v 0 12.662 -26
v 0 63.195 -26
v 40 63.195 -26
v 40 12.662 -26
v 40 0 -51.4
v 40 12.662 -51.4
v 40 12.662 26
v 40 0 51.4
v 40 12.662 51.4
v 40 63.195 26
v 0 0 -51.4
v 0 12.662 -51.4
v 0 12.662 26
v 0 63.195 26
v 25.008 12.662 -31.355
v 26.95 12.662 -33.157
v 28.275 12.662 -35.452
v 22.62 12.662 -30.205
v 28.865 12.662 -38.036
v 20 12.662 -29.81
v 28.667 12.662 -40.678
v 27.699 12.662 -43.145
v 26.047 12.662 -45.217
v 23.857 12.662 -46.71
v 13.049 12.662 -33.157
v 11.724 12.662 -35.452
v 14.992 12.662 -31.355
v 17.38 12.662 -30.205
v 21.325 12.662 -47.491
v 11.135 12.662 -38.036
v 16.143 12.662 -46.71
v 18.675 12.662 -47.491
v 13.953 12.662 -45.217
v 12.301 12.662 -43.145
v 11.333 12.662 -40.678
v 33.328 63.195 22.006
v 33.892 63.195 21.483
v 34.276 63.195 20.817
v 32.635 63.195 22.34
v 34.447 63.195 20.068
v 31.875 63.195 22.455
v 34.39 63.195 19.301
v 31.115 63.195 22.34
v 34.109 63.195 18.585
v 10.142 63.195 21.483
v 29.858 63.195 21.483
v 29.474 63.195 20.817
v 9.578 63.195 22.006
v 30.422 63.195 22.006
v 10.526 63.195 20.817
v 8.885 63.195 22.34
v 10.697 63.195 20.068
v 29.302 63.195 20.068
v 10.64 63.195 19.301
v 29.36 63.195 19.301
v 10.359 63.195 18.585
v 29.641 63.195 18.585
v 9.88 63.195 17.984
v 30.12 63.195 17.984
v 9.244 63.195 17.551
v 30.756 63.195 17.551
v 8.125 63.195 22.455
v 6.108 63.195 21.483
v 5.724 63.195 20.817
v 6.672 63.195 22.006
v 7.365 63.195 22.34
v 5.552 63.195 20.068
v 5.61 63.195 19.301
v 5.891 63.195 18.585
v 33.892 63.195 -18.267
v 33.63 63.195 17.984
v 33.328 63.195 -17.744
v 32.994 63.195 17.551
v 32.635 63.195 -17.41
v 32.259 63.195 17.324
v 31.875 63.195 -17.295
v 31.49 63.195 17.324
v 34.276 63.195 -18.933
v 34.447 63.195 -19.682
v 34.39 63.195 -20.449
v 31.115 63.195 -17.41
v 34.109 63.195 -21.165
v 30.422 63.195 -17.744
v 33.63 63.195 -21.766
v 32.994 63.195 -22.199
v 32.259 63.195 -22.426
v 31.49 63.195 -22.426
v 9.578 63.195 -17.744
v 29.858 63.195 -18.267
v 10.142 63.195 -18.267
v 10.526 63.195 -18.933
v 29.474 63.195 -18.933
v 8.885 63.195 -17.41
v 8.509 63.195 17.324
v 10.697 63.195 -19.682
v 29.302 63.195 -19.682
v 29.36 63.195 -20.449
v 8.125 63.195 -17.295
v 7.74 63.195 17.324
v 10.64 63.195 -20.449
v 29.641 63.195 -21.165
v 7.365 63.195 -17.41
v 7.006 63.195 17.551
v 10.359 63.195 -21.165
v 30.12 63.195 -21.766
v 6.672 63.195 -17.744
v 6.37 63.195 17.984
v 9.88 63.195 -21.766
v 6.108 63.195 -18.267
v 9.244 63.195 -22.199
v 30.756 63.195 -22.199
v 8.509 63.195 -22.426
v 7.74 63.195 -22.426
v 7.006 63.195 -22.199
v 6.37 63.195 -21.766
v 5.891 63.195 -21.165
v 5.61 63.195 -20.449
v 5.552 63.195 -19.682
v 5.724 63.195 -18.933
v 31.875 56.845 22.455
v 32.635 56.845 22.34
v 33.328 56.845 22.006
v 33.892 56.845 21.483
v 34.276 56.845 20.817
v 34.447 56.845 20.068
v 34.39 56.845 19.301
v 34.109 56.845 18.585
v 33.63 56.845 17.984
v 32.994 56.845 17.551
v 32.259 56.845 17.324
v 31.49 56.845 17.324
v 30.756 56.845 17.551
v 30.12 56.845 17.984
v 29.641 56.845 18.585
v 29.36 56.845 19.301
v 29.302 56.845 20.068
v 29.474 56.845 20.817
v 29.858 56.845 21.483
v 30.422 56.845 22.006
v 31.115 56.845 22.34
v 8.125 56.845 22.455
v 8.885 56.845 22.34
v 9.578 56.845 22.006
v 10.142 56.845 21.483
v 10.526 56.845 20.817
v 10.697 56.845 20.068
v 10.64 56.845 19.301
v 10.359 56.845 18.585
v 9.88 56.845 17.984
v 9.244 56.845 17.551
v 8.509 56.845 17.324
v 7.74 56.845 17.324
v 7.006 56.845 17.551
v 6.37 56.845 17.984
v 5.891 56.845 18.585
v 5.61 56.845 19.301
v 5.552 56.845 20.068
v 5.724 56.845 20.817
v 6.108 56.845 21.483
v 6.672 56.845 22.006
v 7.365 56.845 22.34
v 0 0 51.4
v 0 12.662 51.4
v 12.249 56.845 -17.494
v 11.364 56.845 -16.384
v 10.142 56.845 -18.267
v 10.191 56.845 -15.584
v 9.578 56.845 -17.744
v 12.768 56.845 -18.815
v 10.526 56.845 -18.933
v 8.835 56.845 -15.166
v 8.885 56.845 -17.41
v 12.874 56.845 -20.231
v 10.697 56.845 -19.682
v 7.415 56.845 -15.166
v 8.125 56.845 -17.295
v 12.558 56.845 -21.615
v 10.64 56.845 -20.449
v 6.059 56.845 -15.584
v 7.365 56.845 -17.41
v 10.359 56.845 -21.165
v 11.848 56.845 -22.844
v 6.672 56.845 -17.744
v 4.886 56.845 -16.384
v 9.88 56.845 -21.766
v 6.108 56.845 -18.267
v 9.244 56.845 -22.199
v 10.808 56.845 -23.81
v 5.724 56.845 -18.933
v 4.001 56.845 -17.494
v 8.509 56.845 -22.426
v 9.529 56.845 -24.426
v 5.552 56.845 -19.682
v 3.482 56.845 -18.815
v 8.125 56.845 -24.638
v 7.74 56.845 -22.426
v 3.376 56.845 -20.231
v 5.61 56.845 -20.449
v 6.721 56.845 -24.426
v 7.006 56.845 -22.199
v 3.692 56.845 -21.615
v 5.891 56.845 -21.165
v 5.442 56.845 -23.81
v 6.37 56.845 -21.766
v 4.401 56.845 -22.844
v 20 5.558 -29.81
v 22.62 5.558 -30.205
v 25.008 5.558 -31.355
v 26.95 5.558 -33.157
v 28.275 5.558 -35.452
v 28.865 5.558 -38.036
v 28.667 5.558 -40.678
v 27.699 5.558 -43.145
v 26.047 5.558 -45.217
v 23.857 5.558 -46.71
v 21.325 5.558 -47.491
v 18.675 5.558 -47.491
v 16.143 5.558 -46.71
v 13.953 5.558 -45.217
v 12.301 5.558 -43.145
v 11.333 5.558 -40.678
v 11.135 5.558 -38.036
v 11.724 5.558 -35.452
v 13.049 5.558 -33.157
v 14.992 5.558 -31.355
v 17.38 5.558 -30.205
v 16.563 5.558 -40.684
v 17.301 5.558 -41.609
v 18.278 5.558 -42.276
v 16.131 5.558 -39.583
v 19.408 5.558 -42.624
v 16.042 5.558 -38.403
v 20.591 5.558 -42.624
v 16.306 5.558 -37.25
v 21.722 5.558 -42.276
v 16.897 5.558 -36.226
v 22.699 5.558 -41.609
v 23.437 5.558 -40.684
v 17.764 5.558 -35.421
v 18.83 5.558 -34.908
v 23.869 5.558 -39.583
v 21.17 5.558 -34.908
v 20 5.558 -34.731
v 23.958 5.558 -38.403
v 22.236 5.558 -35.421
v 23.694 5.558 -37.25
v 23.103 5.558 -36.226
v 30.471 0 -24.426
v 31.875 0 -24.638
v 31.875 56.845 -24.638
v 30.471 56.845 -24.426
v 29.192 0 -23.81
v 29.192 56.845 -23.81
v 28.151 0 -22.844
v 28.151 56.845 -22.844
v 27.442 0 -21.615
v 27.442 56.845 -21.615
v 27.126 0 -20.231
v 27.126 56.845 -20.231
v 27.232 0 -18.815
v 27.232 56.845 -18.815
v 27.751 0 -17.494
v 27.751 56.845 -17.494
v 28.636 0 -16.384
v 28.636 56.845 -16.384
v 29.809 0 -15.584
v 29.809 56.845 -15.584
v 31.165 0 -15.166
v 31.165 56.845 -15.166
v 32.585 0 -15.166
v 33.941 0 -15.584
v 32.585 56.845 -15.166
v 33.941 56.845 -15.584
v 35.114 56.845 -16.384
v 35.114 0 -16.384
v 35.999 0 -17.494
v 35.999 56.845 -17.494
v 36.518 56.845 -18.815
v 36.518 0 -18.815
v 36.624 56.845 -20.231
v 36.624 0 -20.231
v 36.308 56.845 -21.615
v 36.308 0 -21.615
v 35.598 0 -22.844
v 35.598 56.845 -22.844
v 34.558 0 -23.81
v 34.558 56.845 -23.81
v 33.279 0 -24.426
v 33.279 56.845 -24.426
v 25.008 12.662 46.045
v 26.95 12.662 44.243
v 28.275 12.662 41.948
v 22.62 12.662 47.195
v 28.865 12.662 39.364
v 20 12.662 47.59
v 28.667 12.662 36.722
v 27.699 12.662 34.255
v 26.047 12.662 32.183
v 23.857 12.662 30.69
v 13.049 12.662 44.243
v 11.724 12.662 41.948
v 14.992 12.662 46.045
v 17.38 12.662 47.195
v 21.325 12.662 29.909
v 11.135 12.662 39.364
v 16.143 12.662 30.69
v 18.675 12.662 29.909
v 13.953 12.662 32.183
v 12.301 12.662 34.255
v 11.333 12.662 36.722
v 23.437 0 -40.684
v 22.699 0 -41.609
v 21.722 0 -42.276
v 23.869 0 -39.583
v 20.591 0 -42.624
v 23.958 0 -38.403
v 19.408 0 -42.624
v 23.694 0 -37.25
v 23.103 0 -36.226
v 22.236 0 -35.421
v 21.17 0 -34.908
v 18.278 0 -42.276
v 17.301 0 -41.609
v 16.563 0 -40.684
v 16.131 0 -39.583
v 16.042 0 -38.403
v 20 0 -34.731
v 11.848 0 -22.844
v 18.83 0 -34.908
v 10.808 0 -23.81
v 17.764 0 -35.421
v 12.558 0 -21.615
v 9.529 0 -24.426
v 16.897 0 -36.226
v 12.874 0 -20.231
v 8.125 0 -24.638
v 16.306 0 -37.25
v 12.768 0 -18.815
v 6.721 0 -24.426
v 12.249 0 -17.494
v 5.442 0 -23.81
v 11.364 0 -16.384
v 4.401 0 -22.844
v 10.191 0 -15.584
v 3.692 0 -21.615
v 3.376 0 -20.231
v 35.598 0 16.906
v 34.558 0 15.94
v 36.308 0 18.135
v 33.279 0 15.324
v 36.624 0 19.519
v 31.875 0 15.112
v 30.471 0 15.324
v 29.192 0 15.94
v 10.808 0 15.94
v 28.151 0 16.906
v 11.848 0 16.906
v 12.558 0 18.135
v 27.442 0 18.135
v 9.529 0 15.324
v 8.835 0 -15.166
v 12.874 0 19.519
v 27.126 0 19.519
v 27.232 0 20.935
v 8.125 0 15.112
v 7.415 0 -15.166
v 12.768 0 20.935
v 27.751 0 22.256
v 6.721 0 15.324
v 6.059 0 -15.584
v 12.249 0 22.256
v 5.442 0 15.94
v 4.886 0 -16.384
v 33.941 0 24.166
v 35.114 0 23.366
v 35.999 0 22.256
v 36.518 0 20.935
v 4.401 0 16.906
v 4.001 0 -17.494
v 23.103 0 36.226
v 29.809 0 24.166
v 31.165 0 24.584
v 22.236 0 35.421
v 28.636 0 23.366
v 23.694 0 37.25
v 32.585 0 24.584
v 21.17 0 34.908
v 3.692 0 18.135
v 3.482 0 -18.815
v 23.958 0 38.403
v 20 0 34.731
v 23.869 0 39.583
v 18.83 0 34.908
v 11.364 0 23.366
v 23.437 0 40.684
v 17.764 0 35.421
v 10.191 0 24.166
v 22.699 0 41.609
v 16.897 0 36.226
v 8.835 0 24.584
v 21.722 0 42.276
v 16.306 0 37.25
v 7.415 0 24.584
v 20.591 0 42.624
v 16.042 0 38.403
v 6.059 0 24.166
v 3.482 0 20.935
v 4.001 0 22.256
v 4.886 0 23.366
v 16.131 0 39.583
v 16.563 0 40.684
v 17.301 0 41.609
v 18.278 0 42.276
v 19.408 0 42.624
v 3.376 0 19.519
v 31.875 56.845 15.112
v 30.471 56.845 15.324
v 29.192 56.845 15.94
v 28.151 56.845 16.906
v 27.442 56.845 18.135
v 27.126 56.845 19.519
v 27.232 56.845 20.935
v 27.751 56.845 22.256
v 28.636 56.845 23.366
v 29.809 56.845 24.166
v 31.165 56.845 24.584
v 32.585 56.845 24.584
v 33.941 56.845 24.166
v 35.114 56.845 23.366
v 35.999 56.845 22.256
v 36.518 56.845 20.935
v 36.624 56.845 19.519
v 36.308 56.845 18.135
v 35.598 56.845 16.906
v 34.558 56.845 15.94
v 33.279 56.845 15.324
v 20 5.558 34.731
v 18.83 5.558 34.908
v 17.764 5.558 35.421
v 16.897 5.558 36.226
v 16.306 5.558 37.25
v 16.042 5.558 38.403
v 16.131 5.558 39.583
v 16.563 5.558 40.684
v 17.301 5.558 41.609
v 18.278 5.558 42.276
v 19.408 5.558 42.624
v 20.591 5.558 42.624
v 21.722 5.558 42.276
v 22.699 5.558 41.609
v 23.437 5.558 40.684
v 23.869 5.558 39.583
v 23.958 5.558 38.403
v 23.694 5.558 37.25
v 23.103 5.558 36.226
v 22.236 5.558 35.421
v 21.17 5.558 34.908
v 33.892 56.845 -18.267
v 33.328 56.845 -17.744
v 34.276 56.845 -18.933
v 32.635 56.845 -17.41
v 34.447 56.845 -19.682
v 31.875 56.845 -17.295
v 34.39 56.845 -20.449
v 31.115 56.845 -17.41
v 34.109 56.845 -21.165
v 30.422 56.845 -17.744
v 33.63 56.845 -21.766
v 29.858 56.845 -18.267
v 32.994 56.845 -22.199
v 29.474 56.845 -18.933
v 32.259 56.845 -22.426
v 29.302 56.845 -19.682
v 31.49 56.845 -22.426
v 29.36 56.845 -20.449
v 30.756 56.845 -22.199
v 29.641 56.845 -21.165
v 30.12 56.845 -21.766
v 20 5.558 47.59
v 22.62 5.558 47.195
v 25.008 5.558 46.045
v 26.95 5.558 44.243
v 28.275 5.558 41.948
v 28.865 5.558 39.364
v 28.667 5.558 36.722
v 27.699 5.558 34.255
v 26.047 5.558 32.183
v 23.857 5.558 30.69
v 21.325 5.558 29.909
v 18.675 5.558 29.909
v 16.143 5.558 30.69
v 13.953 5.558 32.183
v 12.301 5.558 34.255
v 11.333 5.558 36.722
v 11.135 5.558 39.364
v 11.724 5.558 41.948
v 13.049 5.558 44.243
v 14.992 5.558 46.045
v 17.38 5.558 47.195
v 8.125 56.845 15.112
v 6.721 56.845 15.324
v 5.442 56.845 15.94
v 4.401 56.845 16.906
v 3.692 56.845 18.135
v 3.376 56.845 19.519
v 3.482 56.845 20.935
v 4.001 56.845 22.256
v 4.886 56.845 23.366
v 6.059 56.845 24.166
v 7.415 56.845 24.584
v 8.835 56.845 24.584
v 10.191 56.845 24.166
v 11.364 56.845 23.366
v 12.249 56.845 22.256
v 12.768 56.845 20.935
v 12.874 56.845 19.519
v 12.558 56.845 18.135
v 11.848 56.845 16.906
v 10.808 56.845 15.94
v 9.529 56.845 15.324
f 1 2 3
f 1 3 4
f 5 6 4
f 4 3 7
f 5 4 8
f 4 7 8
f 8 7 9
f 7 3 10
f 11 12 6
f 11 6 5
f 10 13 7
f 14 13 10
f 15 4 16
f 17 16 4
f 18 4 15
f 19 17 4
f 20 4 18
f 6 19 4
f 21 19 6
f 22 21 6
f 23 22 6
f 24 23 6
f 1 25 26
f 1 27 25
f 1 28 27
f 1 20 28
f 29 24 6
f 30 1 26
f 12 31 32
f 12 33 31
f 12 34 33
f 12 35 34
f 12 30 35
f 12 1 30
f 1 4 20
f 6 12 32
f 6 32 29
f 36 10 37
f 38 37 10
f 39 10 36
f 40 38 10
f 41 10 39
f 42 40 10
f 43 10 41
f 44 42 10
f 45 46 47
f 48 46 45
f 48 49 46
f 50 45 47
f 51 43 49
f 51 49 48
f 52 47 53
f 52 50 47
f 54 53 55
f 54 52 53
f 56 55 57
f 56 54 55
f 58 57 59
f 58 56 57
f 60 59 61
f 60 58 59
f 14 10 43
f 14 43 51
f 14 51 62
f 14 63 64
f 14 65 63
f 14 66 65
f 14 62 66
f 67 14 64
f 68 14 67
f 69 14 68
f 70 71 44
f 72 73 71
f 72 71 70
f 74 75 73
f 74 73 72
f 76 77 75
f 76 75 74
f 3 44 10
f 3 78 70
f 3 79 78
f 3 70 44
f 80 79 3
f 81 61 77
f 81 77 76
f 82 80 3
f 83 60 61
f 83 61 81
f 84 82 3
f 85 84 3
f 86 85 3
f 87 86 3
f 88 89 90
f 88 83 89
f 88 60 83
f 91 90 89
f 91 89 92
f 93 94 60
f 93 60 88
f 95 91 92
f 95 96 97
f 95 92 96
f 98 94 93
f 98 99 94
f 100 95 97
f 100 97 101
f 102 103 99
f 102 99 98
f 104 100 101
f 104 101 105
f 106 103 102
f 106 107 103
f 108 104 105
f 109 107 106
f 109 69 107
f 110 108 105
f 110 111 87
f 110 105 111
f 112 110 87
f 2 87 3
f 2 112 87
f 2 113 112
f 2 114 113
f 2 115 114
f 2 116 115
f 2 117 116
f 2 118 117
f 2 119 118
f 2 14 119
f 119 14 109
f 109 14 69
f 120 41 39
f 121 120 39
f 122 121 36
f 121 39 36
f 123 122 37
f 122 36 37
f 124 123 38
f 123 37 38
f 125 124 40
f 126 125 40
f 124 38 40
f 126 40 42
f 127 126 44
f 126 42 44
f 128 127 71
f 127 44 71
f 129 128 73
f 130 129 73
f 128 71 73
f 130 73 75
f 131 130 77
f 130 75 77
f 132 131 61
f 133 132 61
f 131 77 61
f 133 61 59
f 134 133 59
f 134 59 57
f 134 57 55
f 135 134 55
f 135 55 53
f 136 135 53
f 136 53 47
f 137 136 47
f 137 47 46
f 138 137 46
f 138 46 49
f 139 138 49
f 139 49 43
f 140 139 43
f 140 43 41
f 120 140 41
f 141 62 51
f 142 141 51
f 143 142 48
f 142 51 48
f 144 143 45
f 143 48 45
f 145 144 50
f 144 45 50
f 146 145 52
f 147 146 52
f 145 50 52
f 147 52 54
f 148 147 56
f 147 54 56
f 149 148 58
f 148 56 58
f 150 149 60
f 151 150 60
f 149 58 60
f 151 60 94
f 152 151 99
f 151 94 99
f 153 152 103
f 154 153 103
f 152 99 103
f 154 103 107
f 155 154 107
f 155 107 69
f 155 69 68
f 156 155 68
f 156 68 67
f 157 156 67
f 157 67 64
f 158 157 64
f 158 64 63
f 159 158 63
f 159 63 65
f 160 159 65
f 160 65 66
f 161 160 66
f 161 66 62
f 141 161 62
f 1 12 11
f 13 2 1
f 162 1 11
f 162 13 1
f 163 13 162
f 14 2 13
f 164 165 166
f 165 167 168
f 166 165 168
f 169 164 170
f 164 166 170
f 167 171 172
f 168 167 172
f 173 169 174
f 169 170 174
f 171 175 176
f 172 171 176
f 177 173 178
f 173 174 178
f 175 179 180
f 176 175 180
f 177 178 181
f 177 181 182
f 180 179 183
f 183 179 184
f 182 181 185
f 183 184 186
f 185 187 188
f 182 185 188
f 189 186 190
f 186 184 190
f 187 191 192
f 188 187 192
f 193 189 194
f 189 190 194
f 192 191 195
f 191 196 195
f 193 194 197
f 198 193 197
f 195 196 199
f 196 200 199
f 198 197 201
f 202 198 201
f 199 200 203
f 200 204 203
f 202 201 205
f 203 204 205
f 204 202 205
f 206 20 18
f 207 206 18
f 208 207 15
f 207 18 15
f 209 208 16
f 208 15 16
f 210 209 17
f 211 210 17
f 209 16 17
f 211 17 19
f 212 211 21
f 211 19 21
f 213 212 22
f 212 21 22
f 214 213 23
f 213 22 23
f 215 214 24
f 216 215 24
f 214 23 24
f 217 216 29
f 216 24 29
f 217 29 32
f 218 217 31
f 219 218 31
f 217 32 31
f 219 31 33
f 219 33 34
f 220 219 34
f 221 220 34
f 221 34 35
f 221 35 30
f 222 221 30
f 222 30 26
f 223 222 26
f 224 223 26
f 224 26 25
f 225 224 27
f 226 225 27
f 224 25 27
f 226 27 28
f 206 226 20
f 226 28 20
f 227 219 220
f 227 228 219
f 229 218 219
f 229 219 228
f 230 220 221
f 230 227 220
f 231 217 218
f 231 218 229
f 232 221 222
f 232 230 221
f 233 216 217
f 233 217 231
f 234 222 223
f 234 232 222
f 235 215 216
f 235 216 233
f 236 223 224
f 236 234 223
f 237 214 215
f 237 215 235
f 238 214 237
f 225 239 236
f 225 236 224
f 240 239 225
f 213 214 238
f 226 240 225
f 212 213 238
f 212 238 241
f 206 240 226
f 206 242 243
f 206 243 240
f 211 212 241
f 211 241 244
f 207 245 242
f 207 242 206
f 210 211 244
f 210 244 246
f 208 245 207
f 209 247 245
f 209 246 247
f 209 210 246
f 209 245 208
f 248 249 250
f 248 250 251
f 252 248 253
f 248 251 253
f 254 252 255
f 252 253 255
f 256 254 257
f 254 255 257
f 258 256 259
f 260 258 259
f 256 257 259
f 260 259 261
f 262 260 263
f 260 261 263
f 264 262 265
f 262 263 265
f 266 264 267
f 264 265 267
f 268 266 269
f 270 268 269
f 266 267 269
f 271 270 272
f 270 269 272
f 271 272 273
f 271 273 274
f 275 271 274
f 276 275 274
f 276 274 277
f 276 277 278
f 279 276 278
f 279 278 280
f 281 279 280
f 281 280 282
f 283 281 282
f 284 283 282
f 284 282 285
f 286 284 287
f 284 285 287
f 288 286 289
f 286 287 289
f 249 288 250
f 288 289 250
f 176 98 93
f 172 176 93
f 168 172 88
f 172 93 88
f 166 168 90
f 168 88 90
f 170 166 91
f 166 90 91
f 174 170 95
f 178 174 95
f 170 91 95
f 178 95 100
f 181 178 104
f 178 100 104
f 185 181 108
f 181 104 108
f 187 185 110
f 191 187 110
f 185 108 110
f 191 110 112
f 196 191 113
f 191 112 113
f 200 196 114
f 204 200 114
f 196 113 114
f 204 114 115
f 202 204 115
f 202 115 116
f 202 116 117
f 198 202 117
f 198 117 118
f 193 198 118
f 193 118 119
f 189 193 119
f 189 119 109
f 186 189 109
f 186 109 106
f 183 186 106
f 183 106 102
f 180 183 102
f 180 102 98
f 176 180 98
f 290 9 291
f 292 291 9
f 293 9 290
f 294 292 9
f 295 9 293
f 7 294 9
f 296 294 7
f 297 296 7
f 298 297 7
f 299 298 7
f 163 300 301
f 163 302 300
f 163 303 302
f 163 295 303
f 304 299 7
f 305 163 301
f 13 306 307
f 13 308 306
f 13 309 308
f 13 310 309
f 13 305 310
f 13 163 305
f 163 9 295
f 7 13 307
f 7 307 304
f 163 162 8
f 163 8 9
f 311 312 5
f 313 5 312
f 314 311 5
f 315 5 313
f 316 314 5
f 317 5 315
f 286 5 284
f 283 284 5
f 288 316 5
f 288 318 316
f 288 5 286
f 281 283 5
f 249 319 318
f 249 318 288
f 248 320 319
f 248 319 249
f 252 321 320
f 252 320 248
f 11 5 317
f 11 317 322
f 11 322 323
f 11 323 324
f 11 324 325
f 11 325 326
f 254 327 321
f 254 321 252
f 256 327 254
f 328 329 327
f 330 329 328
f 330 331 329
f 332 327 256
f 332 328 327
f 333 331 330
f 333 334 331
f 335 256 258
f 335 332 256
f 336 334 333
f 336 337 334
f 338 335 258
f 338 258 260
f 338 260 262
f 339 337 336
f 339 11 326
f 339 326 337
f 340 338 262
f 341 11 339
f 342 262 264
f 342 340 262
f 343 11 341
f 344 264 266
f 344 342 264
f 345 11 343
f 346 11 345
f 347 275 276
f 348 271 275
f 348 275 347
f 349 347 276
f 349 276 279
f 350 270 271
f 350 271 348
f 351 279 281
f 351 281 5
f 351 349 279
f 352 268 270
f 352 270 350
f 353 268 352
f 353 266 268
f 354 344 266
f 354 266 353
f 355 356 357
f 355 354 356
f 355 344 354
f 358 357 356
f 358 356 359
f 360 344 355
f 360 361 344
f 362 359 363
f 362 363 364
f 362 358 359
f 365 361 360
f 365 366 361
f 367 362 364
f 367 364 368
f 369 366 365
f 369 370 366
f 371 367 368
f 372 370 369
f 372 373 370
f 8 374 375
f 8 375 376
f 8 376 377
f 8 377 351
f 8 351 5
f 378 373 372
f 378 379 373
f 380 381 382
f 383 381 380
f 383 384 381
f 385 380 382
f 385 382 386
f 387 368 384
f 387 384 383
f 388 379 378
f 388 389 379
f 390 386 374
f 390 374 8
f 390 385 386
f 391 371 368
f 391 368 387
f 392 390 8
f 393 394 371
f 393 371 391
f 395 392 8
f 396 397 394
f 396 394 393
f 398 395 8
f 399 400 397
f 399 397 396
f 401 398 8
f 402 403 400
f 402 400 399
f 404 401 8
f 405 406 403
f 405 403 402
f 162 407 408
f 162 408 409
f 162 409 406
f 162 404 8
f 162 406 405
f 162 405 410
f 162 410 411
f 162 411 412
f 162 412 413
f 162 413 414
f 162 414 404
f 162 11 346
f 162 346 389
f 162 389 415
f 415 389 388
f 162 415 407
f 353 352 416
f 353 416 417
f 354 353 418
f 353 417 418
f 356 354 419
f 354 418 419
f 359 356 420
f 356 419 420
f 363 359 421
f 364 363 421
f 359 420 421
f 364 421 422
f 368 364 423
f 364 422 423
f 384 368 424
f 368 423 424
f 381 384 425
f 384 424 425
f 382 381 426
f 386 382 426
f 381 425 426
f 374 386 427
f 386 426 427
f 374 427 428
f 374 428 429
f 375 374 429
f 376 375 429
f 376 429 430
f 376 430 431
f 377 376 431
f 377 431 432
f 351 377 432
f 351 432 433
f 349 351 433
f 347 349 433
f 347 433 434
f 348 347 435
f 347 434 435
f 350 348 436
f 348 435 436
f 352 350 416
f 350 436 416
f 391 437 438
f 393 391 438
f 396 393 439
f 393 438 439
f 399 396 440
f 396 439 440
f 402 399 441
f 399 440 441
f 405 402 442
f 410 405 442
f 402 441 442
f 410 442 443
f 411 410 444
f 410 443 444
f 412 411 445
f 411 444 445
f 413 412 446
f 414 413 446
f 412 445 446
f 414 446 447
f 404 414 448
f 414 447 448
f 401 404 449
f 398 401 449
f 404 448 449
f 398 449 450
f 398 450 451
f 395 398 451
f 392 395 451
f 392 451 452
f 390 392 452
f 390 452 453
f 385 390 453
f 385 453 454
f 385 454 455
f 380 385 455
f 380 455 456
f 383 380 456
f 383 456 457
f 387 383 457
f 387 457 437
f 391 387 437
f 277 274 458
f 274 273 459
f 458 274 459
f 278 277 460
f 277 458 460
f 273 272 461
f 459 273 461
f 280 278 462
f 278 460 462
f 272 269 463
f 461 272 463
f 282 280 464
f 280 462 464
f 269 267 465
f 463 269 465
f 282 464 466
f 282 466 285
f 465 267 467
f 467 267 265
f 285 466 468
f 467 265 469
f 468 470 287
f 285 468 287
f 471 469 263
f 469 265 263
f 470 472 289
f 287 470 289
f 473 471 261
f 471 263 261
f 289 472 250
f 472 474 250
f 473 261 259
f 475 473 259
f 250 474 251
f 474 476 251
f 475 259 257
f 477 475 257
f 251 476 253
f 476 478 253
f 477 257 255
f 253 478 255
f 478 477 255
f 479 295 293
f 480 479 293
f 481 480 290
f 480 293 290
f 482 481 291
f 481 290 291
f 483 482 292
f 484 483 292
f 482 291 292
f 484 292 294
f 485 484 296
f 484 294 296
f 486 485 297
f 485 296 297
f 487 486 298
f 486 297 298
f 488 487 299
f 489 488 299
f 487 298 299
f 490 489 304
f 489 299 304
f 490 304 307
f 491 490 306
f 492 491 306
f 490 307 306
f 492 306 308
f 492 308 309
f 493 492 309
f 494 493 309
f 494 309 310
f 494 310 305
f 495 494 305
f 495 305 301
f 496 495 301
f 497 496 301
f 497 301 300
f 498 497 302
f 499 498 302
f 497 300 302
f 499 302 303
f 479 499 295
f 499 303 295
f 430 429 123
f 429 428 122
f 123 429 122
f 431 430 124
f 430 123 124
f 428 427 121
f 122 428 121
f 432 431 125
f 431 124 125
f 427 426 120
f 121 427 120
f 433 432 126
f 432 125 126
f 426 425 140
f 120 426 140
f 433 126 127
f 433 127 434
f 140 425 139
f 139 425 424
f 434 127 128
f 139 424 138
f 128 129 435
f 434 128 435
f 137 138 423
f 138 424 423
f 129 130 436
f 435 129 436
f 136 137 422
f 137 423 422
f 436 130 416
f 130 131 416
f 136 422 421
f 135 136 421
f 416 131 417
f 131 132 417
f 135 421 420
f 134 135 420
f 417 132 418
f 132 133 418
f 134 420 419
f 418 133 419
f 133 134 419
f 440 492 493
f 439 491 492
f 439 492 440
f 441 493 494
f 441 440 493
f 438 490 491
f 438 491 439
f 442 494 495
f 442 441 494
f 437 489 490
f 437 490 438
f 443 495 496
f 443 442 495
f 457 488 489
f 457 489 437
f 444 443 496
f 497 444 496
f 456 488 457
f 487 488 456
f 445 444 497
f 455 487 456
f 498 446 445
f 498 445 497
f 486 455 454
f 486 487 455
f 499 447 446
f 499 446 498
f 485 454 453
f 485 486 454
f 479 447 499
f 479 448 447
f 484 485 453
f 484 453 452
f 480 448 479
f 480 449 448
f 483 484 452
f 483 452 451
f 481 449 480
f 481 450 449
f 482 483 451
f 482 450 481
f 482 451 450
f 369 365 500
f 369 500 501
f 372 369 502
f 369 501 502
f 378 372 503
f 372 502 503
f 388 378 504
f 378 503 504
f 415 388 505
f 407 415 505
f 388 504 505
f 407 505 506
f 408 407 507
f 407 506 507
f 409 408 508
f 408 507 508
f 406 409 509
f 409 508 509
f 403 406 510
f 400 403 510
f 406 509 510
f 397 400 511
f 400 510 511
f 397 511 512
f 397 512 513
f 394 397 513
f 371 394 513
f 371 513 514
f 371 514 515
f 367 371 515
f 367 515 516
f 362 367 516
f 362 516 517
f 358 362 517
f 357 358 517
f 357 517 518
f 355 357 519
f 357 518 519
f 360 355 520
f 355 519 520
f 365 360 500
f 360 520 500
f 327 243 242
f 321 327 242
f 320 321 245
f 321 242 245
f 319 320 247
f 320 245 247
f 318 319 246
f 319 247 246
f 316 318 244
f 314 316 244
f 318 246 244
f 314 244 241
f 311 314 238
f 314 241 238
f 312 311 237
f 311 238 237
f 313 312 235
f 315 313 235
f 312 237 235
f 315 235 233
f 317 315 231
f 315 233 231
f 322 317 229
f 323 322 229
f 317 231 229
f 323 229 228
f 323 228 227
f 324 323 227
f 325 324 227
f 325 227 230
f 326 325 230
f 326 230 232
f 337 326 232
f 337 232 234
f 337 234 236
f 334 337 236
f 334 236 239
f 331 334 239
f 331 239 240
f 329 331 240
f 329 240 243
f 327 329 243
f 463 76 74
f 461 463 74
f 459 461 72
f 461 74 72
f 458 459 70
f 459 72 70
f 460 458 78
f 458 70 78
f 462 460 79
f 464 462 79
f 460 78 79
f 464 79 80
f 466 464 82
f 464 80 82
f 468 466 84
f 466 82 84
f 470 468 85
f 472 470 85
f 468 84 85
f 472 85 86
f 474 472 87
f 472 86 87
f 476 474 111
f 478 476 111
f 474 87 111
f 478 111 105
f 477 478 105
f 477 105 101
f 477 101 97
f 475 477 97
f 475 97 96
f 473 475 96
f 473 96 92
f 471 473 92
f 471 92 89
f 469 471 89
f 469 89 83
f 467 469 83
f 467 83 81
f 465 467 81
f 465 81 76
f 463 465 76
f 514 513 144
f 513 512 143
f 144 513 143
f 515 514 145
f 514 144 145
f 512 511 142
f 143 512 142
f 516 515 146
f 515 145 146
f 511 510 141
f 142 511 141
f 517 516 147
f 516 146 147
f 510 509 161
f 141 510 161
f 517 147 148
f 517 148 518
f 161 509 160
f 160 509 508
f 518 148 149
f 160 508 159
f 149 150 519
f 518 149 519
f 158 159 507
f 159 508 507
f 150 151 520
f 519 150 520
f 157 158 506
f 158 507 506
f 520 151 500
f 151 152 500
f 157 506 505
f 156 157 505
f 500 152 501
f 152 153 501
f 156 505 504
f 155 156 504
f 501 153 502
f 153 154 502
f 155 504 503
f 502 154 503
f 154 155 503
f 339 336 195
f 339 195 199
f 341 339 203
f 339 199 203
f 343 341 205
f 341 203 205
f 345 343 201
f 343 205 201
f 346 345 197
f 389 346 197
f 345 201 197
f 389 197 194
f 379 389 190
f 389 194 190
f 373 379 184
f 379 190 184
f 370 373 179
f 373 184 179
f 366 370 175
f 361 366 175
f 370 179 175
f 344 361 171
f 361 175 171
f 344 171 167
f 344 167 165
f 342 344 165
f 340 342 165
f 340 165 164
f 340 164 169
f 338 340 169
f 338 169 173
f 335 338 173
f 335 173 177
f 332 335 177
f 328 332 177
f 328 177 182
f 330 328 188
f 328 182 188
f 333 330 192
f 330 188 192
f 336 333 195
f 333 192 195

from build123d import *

# Parameters (mm, degrees)
BOSS_EXTRUDE1_DEPTH = 39.99992
SKETCH2_R           = 2.5796875
CUT_EXTRUDE1_DEPTH  = 91.750134452
CUT_EXTRUDE2_START  = -6.35
SKETCH2_3_R         = 4.7625
SKETCH2_3_R_2       = 2.5796875
CUT_EXTRUDE2_DEPTH  = 56.8452
SKETCH3_R           = 3.96875
CUT_EXTRUDE3_DEPTH  = 83.435235239
SKETCH3_5_R         = 8.89
SKETCH3_5_R_2       = 3.96875
CUT_EXTRUDE4_DEPTH  = 7.10438


with BuildPart() as part:
    # Sketch1 → Boss-Extrude1 (new body)
    with BuildSketch(Plane(origin=(0, 0, 0), x_dir=(0, 0, -1), z_dir=(1, 0, 0))):
        Polygon((51.4, 0), (-51.4, 0), (-51.4, 12.6619), (-26, 12.6619), (-26, 63.1952), (26, 63.1952), (26, 12.6619), (51.4, 12.6619), align=None)
    extrude(amount=BOSS_EXTRUDE1_DEPTH)

    # Sketch2 → Cut-Extrude1 (cut, through all)
    with BuildSketch(Plane(origin=(0, 63.1952, 0), x_dir=(1, 0, 0), z_dir=(0, 1, 0))):
        with Locations(Location((8.12496, 19.875, 0), (0, 0, 270))):
            Circle(SKETCH2_R)
        with Locations(Location((31.87496, 19.875, 0), (0, 0, 270))):
            Circle(SKETCH2_R)
        with Locations(Location((8.12496, -19.875, 0), (0, 0, 270))):
            Circle(SKETCH2_R)
        with Locations(Location((31.87496, -19.875, 0), (0, 0, 270))):
            Circle(SKETCH2_R)
    extrude(amount=-CUT_EXTRUDE1_DEPTH, mode=Mode.SUBTRACT)

    # Sketch2<3> → Cut-Extrude2 (cut)
    # profile 1 of 4: a face of its own
    with BuildSketch(Plane(origin=(0, 63.1952, 0), x_dir=(1, 0, 0), z_dir=(0, 1, 0)).offset(CUT_EXTRUDE2_START)):
        with Locations(Location((8.12496, 19.875, 0), (0, 0, 90))):
            Circle(SKETCH2_3_R)
        with Locations(Location((8.12496, 19.875, 0), (0, 0, 270))):
            Circle(SKETCH2_3_R_2, mode=Mode.SUBTRACT)
    # profile 2 of 4: a face of its own
    with BuildSketch(Plane(origin=(0, 63.1952, 0), x_dir=(1, 0, 0), z_dir=(0, 1, 0)).offset(CUT_EXTRUDE2_START)):
        with Locations(Location((31.87496, 19.875, 0), (0, 0, 90))):
            Circle(SKETCH2_3_R)
        with Locations(Location((31.87496, 19.875, 0), (0, 0, 270))):
            Circle(SKETCH2_3_R_2, mode=Mode.SUBTRACT)
    # profile 3 of 4: a face of its own
    with BuildSketch(Plane(origin=(0, 63.1952, 0), x_dir=(1, 0, 0), z_dir=(0, 1, 0)).offset(CUT_EXTRUDE2_START)):
        with Locations(Location((8.12496, -19.875, 0), (0, 0, 90))):
            Circle(SKETCH2_3_R)
        with Locations(Location((8.12496, -19.875, 0), (0, 0, 270))):
            Circle(SKETCH2_3_R_2, mode=Mode.SUBTRACT)
    # profile 4 of 4: a face of its own
    with BuildSketch(Plane(origin=(0, 63.1952, 0), x_dir=(1, 0, 0), z_dir=(0, 1, 0)).offset(CUT_EXTRUDE2_START)):
        with Locations(Location((31.87496, -19.875, 0), (0, 0, 90))):
            Circle(SKETCH2_3_R)
        with Locations(Location((31.87496, -19.875, 0), (0, 0, 270))):
            Circle(SKETCH2_3_R_2, mode=Mode.SUBTRACT)
    extrude(amount=-CUT_EXTRUDE2_DEPTH, mode=Mode.SUBTRACT)

    # Sketch3 → Cut-Extrude3 (cut, through all)
    with BuildSketch(Plane(origin=(0, 12.6619, 0), x_dir=(1, 0, 0), z_dir=(0, 1, 0))):
        with Locations(Location((19.99996, 38.7, 0), (0, 0, 270))):
            Circle(SKETCH3_R)
        with Locations(Location((19.99996, -38.7, 0), (0, 0, 90))):
            Circle(SKETCH3_R)
    extrude(amount=-CUT_EXTRUDE3_DEPTH, mode=Mode.SUBTRACT)

    # Sketch3<5> → Cut-Extrude4 (cut)
    # profile 1 of 2: a face of its own
    with BuildSketch(Plane(origin=(0, 12.6619, 0), x_dir=(1, 0, 0), z_dir=(0, 1, 0))):
        with Locations(Location((19.99996, 38.7, 0), (0, 0, 270))):
            Circle(SKETCH3_5_R)
        with Locations(Location((19.99996, 38.7, 0), (0, 0, 270))):
            Circle(SKETCH3_5_R_2, mode=Mode.SUBTRACT)
    # profile 2 of 2: a face of its own
    with BuildSketch(Plane(origin=(0, 12.6619, 0), x_dir=(1, 0, 0), z_dir=(0, 1, 0))):
        with Locations(Location((19.99996, -38.7, 0), (0, 0, 270))):
            Circle(SKETCH3_5_R)
        with Locations(Location((19.99996, -38.7, 0), (0, 0, 270))):
            Circle(SKETCH3_5_R_2, mode=Mode.SUBTRACT)
    extrude(amount=-CUT_EXTRUDE4_DEPTH, mode=Mode.SUBTRACT)


solid = part.part
